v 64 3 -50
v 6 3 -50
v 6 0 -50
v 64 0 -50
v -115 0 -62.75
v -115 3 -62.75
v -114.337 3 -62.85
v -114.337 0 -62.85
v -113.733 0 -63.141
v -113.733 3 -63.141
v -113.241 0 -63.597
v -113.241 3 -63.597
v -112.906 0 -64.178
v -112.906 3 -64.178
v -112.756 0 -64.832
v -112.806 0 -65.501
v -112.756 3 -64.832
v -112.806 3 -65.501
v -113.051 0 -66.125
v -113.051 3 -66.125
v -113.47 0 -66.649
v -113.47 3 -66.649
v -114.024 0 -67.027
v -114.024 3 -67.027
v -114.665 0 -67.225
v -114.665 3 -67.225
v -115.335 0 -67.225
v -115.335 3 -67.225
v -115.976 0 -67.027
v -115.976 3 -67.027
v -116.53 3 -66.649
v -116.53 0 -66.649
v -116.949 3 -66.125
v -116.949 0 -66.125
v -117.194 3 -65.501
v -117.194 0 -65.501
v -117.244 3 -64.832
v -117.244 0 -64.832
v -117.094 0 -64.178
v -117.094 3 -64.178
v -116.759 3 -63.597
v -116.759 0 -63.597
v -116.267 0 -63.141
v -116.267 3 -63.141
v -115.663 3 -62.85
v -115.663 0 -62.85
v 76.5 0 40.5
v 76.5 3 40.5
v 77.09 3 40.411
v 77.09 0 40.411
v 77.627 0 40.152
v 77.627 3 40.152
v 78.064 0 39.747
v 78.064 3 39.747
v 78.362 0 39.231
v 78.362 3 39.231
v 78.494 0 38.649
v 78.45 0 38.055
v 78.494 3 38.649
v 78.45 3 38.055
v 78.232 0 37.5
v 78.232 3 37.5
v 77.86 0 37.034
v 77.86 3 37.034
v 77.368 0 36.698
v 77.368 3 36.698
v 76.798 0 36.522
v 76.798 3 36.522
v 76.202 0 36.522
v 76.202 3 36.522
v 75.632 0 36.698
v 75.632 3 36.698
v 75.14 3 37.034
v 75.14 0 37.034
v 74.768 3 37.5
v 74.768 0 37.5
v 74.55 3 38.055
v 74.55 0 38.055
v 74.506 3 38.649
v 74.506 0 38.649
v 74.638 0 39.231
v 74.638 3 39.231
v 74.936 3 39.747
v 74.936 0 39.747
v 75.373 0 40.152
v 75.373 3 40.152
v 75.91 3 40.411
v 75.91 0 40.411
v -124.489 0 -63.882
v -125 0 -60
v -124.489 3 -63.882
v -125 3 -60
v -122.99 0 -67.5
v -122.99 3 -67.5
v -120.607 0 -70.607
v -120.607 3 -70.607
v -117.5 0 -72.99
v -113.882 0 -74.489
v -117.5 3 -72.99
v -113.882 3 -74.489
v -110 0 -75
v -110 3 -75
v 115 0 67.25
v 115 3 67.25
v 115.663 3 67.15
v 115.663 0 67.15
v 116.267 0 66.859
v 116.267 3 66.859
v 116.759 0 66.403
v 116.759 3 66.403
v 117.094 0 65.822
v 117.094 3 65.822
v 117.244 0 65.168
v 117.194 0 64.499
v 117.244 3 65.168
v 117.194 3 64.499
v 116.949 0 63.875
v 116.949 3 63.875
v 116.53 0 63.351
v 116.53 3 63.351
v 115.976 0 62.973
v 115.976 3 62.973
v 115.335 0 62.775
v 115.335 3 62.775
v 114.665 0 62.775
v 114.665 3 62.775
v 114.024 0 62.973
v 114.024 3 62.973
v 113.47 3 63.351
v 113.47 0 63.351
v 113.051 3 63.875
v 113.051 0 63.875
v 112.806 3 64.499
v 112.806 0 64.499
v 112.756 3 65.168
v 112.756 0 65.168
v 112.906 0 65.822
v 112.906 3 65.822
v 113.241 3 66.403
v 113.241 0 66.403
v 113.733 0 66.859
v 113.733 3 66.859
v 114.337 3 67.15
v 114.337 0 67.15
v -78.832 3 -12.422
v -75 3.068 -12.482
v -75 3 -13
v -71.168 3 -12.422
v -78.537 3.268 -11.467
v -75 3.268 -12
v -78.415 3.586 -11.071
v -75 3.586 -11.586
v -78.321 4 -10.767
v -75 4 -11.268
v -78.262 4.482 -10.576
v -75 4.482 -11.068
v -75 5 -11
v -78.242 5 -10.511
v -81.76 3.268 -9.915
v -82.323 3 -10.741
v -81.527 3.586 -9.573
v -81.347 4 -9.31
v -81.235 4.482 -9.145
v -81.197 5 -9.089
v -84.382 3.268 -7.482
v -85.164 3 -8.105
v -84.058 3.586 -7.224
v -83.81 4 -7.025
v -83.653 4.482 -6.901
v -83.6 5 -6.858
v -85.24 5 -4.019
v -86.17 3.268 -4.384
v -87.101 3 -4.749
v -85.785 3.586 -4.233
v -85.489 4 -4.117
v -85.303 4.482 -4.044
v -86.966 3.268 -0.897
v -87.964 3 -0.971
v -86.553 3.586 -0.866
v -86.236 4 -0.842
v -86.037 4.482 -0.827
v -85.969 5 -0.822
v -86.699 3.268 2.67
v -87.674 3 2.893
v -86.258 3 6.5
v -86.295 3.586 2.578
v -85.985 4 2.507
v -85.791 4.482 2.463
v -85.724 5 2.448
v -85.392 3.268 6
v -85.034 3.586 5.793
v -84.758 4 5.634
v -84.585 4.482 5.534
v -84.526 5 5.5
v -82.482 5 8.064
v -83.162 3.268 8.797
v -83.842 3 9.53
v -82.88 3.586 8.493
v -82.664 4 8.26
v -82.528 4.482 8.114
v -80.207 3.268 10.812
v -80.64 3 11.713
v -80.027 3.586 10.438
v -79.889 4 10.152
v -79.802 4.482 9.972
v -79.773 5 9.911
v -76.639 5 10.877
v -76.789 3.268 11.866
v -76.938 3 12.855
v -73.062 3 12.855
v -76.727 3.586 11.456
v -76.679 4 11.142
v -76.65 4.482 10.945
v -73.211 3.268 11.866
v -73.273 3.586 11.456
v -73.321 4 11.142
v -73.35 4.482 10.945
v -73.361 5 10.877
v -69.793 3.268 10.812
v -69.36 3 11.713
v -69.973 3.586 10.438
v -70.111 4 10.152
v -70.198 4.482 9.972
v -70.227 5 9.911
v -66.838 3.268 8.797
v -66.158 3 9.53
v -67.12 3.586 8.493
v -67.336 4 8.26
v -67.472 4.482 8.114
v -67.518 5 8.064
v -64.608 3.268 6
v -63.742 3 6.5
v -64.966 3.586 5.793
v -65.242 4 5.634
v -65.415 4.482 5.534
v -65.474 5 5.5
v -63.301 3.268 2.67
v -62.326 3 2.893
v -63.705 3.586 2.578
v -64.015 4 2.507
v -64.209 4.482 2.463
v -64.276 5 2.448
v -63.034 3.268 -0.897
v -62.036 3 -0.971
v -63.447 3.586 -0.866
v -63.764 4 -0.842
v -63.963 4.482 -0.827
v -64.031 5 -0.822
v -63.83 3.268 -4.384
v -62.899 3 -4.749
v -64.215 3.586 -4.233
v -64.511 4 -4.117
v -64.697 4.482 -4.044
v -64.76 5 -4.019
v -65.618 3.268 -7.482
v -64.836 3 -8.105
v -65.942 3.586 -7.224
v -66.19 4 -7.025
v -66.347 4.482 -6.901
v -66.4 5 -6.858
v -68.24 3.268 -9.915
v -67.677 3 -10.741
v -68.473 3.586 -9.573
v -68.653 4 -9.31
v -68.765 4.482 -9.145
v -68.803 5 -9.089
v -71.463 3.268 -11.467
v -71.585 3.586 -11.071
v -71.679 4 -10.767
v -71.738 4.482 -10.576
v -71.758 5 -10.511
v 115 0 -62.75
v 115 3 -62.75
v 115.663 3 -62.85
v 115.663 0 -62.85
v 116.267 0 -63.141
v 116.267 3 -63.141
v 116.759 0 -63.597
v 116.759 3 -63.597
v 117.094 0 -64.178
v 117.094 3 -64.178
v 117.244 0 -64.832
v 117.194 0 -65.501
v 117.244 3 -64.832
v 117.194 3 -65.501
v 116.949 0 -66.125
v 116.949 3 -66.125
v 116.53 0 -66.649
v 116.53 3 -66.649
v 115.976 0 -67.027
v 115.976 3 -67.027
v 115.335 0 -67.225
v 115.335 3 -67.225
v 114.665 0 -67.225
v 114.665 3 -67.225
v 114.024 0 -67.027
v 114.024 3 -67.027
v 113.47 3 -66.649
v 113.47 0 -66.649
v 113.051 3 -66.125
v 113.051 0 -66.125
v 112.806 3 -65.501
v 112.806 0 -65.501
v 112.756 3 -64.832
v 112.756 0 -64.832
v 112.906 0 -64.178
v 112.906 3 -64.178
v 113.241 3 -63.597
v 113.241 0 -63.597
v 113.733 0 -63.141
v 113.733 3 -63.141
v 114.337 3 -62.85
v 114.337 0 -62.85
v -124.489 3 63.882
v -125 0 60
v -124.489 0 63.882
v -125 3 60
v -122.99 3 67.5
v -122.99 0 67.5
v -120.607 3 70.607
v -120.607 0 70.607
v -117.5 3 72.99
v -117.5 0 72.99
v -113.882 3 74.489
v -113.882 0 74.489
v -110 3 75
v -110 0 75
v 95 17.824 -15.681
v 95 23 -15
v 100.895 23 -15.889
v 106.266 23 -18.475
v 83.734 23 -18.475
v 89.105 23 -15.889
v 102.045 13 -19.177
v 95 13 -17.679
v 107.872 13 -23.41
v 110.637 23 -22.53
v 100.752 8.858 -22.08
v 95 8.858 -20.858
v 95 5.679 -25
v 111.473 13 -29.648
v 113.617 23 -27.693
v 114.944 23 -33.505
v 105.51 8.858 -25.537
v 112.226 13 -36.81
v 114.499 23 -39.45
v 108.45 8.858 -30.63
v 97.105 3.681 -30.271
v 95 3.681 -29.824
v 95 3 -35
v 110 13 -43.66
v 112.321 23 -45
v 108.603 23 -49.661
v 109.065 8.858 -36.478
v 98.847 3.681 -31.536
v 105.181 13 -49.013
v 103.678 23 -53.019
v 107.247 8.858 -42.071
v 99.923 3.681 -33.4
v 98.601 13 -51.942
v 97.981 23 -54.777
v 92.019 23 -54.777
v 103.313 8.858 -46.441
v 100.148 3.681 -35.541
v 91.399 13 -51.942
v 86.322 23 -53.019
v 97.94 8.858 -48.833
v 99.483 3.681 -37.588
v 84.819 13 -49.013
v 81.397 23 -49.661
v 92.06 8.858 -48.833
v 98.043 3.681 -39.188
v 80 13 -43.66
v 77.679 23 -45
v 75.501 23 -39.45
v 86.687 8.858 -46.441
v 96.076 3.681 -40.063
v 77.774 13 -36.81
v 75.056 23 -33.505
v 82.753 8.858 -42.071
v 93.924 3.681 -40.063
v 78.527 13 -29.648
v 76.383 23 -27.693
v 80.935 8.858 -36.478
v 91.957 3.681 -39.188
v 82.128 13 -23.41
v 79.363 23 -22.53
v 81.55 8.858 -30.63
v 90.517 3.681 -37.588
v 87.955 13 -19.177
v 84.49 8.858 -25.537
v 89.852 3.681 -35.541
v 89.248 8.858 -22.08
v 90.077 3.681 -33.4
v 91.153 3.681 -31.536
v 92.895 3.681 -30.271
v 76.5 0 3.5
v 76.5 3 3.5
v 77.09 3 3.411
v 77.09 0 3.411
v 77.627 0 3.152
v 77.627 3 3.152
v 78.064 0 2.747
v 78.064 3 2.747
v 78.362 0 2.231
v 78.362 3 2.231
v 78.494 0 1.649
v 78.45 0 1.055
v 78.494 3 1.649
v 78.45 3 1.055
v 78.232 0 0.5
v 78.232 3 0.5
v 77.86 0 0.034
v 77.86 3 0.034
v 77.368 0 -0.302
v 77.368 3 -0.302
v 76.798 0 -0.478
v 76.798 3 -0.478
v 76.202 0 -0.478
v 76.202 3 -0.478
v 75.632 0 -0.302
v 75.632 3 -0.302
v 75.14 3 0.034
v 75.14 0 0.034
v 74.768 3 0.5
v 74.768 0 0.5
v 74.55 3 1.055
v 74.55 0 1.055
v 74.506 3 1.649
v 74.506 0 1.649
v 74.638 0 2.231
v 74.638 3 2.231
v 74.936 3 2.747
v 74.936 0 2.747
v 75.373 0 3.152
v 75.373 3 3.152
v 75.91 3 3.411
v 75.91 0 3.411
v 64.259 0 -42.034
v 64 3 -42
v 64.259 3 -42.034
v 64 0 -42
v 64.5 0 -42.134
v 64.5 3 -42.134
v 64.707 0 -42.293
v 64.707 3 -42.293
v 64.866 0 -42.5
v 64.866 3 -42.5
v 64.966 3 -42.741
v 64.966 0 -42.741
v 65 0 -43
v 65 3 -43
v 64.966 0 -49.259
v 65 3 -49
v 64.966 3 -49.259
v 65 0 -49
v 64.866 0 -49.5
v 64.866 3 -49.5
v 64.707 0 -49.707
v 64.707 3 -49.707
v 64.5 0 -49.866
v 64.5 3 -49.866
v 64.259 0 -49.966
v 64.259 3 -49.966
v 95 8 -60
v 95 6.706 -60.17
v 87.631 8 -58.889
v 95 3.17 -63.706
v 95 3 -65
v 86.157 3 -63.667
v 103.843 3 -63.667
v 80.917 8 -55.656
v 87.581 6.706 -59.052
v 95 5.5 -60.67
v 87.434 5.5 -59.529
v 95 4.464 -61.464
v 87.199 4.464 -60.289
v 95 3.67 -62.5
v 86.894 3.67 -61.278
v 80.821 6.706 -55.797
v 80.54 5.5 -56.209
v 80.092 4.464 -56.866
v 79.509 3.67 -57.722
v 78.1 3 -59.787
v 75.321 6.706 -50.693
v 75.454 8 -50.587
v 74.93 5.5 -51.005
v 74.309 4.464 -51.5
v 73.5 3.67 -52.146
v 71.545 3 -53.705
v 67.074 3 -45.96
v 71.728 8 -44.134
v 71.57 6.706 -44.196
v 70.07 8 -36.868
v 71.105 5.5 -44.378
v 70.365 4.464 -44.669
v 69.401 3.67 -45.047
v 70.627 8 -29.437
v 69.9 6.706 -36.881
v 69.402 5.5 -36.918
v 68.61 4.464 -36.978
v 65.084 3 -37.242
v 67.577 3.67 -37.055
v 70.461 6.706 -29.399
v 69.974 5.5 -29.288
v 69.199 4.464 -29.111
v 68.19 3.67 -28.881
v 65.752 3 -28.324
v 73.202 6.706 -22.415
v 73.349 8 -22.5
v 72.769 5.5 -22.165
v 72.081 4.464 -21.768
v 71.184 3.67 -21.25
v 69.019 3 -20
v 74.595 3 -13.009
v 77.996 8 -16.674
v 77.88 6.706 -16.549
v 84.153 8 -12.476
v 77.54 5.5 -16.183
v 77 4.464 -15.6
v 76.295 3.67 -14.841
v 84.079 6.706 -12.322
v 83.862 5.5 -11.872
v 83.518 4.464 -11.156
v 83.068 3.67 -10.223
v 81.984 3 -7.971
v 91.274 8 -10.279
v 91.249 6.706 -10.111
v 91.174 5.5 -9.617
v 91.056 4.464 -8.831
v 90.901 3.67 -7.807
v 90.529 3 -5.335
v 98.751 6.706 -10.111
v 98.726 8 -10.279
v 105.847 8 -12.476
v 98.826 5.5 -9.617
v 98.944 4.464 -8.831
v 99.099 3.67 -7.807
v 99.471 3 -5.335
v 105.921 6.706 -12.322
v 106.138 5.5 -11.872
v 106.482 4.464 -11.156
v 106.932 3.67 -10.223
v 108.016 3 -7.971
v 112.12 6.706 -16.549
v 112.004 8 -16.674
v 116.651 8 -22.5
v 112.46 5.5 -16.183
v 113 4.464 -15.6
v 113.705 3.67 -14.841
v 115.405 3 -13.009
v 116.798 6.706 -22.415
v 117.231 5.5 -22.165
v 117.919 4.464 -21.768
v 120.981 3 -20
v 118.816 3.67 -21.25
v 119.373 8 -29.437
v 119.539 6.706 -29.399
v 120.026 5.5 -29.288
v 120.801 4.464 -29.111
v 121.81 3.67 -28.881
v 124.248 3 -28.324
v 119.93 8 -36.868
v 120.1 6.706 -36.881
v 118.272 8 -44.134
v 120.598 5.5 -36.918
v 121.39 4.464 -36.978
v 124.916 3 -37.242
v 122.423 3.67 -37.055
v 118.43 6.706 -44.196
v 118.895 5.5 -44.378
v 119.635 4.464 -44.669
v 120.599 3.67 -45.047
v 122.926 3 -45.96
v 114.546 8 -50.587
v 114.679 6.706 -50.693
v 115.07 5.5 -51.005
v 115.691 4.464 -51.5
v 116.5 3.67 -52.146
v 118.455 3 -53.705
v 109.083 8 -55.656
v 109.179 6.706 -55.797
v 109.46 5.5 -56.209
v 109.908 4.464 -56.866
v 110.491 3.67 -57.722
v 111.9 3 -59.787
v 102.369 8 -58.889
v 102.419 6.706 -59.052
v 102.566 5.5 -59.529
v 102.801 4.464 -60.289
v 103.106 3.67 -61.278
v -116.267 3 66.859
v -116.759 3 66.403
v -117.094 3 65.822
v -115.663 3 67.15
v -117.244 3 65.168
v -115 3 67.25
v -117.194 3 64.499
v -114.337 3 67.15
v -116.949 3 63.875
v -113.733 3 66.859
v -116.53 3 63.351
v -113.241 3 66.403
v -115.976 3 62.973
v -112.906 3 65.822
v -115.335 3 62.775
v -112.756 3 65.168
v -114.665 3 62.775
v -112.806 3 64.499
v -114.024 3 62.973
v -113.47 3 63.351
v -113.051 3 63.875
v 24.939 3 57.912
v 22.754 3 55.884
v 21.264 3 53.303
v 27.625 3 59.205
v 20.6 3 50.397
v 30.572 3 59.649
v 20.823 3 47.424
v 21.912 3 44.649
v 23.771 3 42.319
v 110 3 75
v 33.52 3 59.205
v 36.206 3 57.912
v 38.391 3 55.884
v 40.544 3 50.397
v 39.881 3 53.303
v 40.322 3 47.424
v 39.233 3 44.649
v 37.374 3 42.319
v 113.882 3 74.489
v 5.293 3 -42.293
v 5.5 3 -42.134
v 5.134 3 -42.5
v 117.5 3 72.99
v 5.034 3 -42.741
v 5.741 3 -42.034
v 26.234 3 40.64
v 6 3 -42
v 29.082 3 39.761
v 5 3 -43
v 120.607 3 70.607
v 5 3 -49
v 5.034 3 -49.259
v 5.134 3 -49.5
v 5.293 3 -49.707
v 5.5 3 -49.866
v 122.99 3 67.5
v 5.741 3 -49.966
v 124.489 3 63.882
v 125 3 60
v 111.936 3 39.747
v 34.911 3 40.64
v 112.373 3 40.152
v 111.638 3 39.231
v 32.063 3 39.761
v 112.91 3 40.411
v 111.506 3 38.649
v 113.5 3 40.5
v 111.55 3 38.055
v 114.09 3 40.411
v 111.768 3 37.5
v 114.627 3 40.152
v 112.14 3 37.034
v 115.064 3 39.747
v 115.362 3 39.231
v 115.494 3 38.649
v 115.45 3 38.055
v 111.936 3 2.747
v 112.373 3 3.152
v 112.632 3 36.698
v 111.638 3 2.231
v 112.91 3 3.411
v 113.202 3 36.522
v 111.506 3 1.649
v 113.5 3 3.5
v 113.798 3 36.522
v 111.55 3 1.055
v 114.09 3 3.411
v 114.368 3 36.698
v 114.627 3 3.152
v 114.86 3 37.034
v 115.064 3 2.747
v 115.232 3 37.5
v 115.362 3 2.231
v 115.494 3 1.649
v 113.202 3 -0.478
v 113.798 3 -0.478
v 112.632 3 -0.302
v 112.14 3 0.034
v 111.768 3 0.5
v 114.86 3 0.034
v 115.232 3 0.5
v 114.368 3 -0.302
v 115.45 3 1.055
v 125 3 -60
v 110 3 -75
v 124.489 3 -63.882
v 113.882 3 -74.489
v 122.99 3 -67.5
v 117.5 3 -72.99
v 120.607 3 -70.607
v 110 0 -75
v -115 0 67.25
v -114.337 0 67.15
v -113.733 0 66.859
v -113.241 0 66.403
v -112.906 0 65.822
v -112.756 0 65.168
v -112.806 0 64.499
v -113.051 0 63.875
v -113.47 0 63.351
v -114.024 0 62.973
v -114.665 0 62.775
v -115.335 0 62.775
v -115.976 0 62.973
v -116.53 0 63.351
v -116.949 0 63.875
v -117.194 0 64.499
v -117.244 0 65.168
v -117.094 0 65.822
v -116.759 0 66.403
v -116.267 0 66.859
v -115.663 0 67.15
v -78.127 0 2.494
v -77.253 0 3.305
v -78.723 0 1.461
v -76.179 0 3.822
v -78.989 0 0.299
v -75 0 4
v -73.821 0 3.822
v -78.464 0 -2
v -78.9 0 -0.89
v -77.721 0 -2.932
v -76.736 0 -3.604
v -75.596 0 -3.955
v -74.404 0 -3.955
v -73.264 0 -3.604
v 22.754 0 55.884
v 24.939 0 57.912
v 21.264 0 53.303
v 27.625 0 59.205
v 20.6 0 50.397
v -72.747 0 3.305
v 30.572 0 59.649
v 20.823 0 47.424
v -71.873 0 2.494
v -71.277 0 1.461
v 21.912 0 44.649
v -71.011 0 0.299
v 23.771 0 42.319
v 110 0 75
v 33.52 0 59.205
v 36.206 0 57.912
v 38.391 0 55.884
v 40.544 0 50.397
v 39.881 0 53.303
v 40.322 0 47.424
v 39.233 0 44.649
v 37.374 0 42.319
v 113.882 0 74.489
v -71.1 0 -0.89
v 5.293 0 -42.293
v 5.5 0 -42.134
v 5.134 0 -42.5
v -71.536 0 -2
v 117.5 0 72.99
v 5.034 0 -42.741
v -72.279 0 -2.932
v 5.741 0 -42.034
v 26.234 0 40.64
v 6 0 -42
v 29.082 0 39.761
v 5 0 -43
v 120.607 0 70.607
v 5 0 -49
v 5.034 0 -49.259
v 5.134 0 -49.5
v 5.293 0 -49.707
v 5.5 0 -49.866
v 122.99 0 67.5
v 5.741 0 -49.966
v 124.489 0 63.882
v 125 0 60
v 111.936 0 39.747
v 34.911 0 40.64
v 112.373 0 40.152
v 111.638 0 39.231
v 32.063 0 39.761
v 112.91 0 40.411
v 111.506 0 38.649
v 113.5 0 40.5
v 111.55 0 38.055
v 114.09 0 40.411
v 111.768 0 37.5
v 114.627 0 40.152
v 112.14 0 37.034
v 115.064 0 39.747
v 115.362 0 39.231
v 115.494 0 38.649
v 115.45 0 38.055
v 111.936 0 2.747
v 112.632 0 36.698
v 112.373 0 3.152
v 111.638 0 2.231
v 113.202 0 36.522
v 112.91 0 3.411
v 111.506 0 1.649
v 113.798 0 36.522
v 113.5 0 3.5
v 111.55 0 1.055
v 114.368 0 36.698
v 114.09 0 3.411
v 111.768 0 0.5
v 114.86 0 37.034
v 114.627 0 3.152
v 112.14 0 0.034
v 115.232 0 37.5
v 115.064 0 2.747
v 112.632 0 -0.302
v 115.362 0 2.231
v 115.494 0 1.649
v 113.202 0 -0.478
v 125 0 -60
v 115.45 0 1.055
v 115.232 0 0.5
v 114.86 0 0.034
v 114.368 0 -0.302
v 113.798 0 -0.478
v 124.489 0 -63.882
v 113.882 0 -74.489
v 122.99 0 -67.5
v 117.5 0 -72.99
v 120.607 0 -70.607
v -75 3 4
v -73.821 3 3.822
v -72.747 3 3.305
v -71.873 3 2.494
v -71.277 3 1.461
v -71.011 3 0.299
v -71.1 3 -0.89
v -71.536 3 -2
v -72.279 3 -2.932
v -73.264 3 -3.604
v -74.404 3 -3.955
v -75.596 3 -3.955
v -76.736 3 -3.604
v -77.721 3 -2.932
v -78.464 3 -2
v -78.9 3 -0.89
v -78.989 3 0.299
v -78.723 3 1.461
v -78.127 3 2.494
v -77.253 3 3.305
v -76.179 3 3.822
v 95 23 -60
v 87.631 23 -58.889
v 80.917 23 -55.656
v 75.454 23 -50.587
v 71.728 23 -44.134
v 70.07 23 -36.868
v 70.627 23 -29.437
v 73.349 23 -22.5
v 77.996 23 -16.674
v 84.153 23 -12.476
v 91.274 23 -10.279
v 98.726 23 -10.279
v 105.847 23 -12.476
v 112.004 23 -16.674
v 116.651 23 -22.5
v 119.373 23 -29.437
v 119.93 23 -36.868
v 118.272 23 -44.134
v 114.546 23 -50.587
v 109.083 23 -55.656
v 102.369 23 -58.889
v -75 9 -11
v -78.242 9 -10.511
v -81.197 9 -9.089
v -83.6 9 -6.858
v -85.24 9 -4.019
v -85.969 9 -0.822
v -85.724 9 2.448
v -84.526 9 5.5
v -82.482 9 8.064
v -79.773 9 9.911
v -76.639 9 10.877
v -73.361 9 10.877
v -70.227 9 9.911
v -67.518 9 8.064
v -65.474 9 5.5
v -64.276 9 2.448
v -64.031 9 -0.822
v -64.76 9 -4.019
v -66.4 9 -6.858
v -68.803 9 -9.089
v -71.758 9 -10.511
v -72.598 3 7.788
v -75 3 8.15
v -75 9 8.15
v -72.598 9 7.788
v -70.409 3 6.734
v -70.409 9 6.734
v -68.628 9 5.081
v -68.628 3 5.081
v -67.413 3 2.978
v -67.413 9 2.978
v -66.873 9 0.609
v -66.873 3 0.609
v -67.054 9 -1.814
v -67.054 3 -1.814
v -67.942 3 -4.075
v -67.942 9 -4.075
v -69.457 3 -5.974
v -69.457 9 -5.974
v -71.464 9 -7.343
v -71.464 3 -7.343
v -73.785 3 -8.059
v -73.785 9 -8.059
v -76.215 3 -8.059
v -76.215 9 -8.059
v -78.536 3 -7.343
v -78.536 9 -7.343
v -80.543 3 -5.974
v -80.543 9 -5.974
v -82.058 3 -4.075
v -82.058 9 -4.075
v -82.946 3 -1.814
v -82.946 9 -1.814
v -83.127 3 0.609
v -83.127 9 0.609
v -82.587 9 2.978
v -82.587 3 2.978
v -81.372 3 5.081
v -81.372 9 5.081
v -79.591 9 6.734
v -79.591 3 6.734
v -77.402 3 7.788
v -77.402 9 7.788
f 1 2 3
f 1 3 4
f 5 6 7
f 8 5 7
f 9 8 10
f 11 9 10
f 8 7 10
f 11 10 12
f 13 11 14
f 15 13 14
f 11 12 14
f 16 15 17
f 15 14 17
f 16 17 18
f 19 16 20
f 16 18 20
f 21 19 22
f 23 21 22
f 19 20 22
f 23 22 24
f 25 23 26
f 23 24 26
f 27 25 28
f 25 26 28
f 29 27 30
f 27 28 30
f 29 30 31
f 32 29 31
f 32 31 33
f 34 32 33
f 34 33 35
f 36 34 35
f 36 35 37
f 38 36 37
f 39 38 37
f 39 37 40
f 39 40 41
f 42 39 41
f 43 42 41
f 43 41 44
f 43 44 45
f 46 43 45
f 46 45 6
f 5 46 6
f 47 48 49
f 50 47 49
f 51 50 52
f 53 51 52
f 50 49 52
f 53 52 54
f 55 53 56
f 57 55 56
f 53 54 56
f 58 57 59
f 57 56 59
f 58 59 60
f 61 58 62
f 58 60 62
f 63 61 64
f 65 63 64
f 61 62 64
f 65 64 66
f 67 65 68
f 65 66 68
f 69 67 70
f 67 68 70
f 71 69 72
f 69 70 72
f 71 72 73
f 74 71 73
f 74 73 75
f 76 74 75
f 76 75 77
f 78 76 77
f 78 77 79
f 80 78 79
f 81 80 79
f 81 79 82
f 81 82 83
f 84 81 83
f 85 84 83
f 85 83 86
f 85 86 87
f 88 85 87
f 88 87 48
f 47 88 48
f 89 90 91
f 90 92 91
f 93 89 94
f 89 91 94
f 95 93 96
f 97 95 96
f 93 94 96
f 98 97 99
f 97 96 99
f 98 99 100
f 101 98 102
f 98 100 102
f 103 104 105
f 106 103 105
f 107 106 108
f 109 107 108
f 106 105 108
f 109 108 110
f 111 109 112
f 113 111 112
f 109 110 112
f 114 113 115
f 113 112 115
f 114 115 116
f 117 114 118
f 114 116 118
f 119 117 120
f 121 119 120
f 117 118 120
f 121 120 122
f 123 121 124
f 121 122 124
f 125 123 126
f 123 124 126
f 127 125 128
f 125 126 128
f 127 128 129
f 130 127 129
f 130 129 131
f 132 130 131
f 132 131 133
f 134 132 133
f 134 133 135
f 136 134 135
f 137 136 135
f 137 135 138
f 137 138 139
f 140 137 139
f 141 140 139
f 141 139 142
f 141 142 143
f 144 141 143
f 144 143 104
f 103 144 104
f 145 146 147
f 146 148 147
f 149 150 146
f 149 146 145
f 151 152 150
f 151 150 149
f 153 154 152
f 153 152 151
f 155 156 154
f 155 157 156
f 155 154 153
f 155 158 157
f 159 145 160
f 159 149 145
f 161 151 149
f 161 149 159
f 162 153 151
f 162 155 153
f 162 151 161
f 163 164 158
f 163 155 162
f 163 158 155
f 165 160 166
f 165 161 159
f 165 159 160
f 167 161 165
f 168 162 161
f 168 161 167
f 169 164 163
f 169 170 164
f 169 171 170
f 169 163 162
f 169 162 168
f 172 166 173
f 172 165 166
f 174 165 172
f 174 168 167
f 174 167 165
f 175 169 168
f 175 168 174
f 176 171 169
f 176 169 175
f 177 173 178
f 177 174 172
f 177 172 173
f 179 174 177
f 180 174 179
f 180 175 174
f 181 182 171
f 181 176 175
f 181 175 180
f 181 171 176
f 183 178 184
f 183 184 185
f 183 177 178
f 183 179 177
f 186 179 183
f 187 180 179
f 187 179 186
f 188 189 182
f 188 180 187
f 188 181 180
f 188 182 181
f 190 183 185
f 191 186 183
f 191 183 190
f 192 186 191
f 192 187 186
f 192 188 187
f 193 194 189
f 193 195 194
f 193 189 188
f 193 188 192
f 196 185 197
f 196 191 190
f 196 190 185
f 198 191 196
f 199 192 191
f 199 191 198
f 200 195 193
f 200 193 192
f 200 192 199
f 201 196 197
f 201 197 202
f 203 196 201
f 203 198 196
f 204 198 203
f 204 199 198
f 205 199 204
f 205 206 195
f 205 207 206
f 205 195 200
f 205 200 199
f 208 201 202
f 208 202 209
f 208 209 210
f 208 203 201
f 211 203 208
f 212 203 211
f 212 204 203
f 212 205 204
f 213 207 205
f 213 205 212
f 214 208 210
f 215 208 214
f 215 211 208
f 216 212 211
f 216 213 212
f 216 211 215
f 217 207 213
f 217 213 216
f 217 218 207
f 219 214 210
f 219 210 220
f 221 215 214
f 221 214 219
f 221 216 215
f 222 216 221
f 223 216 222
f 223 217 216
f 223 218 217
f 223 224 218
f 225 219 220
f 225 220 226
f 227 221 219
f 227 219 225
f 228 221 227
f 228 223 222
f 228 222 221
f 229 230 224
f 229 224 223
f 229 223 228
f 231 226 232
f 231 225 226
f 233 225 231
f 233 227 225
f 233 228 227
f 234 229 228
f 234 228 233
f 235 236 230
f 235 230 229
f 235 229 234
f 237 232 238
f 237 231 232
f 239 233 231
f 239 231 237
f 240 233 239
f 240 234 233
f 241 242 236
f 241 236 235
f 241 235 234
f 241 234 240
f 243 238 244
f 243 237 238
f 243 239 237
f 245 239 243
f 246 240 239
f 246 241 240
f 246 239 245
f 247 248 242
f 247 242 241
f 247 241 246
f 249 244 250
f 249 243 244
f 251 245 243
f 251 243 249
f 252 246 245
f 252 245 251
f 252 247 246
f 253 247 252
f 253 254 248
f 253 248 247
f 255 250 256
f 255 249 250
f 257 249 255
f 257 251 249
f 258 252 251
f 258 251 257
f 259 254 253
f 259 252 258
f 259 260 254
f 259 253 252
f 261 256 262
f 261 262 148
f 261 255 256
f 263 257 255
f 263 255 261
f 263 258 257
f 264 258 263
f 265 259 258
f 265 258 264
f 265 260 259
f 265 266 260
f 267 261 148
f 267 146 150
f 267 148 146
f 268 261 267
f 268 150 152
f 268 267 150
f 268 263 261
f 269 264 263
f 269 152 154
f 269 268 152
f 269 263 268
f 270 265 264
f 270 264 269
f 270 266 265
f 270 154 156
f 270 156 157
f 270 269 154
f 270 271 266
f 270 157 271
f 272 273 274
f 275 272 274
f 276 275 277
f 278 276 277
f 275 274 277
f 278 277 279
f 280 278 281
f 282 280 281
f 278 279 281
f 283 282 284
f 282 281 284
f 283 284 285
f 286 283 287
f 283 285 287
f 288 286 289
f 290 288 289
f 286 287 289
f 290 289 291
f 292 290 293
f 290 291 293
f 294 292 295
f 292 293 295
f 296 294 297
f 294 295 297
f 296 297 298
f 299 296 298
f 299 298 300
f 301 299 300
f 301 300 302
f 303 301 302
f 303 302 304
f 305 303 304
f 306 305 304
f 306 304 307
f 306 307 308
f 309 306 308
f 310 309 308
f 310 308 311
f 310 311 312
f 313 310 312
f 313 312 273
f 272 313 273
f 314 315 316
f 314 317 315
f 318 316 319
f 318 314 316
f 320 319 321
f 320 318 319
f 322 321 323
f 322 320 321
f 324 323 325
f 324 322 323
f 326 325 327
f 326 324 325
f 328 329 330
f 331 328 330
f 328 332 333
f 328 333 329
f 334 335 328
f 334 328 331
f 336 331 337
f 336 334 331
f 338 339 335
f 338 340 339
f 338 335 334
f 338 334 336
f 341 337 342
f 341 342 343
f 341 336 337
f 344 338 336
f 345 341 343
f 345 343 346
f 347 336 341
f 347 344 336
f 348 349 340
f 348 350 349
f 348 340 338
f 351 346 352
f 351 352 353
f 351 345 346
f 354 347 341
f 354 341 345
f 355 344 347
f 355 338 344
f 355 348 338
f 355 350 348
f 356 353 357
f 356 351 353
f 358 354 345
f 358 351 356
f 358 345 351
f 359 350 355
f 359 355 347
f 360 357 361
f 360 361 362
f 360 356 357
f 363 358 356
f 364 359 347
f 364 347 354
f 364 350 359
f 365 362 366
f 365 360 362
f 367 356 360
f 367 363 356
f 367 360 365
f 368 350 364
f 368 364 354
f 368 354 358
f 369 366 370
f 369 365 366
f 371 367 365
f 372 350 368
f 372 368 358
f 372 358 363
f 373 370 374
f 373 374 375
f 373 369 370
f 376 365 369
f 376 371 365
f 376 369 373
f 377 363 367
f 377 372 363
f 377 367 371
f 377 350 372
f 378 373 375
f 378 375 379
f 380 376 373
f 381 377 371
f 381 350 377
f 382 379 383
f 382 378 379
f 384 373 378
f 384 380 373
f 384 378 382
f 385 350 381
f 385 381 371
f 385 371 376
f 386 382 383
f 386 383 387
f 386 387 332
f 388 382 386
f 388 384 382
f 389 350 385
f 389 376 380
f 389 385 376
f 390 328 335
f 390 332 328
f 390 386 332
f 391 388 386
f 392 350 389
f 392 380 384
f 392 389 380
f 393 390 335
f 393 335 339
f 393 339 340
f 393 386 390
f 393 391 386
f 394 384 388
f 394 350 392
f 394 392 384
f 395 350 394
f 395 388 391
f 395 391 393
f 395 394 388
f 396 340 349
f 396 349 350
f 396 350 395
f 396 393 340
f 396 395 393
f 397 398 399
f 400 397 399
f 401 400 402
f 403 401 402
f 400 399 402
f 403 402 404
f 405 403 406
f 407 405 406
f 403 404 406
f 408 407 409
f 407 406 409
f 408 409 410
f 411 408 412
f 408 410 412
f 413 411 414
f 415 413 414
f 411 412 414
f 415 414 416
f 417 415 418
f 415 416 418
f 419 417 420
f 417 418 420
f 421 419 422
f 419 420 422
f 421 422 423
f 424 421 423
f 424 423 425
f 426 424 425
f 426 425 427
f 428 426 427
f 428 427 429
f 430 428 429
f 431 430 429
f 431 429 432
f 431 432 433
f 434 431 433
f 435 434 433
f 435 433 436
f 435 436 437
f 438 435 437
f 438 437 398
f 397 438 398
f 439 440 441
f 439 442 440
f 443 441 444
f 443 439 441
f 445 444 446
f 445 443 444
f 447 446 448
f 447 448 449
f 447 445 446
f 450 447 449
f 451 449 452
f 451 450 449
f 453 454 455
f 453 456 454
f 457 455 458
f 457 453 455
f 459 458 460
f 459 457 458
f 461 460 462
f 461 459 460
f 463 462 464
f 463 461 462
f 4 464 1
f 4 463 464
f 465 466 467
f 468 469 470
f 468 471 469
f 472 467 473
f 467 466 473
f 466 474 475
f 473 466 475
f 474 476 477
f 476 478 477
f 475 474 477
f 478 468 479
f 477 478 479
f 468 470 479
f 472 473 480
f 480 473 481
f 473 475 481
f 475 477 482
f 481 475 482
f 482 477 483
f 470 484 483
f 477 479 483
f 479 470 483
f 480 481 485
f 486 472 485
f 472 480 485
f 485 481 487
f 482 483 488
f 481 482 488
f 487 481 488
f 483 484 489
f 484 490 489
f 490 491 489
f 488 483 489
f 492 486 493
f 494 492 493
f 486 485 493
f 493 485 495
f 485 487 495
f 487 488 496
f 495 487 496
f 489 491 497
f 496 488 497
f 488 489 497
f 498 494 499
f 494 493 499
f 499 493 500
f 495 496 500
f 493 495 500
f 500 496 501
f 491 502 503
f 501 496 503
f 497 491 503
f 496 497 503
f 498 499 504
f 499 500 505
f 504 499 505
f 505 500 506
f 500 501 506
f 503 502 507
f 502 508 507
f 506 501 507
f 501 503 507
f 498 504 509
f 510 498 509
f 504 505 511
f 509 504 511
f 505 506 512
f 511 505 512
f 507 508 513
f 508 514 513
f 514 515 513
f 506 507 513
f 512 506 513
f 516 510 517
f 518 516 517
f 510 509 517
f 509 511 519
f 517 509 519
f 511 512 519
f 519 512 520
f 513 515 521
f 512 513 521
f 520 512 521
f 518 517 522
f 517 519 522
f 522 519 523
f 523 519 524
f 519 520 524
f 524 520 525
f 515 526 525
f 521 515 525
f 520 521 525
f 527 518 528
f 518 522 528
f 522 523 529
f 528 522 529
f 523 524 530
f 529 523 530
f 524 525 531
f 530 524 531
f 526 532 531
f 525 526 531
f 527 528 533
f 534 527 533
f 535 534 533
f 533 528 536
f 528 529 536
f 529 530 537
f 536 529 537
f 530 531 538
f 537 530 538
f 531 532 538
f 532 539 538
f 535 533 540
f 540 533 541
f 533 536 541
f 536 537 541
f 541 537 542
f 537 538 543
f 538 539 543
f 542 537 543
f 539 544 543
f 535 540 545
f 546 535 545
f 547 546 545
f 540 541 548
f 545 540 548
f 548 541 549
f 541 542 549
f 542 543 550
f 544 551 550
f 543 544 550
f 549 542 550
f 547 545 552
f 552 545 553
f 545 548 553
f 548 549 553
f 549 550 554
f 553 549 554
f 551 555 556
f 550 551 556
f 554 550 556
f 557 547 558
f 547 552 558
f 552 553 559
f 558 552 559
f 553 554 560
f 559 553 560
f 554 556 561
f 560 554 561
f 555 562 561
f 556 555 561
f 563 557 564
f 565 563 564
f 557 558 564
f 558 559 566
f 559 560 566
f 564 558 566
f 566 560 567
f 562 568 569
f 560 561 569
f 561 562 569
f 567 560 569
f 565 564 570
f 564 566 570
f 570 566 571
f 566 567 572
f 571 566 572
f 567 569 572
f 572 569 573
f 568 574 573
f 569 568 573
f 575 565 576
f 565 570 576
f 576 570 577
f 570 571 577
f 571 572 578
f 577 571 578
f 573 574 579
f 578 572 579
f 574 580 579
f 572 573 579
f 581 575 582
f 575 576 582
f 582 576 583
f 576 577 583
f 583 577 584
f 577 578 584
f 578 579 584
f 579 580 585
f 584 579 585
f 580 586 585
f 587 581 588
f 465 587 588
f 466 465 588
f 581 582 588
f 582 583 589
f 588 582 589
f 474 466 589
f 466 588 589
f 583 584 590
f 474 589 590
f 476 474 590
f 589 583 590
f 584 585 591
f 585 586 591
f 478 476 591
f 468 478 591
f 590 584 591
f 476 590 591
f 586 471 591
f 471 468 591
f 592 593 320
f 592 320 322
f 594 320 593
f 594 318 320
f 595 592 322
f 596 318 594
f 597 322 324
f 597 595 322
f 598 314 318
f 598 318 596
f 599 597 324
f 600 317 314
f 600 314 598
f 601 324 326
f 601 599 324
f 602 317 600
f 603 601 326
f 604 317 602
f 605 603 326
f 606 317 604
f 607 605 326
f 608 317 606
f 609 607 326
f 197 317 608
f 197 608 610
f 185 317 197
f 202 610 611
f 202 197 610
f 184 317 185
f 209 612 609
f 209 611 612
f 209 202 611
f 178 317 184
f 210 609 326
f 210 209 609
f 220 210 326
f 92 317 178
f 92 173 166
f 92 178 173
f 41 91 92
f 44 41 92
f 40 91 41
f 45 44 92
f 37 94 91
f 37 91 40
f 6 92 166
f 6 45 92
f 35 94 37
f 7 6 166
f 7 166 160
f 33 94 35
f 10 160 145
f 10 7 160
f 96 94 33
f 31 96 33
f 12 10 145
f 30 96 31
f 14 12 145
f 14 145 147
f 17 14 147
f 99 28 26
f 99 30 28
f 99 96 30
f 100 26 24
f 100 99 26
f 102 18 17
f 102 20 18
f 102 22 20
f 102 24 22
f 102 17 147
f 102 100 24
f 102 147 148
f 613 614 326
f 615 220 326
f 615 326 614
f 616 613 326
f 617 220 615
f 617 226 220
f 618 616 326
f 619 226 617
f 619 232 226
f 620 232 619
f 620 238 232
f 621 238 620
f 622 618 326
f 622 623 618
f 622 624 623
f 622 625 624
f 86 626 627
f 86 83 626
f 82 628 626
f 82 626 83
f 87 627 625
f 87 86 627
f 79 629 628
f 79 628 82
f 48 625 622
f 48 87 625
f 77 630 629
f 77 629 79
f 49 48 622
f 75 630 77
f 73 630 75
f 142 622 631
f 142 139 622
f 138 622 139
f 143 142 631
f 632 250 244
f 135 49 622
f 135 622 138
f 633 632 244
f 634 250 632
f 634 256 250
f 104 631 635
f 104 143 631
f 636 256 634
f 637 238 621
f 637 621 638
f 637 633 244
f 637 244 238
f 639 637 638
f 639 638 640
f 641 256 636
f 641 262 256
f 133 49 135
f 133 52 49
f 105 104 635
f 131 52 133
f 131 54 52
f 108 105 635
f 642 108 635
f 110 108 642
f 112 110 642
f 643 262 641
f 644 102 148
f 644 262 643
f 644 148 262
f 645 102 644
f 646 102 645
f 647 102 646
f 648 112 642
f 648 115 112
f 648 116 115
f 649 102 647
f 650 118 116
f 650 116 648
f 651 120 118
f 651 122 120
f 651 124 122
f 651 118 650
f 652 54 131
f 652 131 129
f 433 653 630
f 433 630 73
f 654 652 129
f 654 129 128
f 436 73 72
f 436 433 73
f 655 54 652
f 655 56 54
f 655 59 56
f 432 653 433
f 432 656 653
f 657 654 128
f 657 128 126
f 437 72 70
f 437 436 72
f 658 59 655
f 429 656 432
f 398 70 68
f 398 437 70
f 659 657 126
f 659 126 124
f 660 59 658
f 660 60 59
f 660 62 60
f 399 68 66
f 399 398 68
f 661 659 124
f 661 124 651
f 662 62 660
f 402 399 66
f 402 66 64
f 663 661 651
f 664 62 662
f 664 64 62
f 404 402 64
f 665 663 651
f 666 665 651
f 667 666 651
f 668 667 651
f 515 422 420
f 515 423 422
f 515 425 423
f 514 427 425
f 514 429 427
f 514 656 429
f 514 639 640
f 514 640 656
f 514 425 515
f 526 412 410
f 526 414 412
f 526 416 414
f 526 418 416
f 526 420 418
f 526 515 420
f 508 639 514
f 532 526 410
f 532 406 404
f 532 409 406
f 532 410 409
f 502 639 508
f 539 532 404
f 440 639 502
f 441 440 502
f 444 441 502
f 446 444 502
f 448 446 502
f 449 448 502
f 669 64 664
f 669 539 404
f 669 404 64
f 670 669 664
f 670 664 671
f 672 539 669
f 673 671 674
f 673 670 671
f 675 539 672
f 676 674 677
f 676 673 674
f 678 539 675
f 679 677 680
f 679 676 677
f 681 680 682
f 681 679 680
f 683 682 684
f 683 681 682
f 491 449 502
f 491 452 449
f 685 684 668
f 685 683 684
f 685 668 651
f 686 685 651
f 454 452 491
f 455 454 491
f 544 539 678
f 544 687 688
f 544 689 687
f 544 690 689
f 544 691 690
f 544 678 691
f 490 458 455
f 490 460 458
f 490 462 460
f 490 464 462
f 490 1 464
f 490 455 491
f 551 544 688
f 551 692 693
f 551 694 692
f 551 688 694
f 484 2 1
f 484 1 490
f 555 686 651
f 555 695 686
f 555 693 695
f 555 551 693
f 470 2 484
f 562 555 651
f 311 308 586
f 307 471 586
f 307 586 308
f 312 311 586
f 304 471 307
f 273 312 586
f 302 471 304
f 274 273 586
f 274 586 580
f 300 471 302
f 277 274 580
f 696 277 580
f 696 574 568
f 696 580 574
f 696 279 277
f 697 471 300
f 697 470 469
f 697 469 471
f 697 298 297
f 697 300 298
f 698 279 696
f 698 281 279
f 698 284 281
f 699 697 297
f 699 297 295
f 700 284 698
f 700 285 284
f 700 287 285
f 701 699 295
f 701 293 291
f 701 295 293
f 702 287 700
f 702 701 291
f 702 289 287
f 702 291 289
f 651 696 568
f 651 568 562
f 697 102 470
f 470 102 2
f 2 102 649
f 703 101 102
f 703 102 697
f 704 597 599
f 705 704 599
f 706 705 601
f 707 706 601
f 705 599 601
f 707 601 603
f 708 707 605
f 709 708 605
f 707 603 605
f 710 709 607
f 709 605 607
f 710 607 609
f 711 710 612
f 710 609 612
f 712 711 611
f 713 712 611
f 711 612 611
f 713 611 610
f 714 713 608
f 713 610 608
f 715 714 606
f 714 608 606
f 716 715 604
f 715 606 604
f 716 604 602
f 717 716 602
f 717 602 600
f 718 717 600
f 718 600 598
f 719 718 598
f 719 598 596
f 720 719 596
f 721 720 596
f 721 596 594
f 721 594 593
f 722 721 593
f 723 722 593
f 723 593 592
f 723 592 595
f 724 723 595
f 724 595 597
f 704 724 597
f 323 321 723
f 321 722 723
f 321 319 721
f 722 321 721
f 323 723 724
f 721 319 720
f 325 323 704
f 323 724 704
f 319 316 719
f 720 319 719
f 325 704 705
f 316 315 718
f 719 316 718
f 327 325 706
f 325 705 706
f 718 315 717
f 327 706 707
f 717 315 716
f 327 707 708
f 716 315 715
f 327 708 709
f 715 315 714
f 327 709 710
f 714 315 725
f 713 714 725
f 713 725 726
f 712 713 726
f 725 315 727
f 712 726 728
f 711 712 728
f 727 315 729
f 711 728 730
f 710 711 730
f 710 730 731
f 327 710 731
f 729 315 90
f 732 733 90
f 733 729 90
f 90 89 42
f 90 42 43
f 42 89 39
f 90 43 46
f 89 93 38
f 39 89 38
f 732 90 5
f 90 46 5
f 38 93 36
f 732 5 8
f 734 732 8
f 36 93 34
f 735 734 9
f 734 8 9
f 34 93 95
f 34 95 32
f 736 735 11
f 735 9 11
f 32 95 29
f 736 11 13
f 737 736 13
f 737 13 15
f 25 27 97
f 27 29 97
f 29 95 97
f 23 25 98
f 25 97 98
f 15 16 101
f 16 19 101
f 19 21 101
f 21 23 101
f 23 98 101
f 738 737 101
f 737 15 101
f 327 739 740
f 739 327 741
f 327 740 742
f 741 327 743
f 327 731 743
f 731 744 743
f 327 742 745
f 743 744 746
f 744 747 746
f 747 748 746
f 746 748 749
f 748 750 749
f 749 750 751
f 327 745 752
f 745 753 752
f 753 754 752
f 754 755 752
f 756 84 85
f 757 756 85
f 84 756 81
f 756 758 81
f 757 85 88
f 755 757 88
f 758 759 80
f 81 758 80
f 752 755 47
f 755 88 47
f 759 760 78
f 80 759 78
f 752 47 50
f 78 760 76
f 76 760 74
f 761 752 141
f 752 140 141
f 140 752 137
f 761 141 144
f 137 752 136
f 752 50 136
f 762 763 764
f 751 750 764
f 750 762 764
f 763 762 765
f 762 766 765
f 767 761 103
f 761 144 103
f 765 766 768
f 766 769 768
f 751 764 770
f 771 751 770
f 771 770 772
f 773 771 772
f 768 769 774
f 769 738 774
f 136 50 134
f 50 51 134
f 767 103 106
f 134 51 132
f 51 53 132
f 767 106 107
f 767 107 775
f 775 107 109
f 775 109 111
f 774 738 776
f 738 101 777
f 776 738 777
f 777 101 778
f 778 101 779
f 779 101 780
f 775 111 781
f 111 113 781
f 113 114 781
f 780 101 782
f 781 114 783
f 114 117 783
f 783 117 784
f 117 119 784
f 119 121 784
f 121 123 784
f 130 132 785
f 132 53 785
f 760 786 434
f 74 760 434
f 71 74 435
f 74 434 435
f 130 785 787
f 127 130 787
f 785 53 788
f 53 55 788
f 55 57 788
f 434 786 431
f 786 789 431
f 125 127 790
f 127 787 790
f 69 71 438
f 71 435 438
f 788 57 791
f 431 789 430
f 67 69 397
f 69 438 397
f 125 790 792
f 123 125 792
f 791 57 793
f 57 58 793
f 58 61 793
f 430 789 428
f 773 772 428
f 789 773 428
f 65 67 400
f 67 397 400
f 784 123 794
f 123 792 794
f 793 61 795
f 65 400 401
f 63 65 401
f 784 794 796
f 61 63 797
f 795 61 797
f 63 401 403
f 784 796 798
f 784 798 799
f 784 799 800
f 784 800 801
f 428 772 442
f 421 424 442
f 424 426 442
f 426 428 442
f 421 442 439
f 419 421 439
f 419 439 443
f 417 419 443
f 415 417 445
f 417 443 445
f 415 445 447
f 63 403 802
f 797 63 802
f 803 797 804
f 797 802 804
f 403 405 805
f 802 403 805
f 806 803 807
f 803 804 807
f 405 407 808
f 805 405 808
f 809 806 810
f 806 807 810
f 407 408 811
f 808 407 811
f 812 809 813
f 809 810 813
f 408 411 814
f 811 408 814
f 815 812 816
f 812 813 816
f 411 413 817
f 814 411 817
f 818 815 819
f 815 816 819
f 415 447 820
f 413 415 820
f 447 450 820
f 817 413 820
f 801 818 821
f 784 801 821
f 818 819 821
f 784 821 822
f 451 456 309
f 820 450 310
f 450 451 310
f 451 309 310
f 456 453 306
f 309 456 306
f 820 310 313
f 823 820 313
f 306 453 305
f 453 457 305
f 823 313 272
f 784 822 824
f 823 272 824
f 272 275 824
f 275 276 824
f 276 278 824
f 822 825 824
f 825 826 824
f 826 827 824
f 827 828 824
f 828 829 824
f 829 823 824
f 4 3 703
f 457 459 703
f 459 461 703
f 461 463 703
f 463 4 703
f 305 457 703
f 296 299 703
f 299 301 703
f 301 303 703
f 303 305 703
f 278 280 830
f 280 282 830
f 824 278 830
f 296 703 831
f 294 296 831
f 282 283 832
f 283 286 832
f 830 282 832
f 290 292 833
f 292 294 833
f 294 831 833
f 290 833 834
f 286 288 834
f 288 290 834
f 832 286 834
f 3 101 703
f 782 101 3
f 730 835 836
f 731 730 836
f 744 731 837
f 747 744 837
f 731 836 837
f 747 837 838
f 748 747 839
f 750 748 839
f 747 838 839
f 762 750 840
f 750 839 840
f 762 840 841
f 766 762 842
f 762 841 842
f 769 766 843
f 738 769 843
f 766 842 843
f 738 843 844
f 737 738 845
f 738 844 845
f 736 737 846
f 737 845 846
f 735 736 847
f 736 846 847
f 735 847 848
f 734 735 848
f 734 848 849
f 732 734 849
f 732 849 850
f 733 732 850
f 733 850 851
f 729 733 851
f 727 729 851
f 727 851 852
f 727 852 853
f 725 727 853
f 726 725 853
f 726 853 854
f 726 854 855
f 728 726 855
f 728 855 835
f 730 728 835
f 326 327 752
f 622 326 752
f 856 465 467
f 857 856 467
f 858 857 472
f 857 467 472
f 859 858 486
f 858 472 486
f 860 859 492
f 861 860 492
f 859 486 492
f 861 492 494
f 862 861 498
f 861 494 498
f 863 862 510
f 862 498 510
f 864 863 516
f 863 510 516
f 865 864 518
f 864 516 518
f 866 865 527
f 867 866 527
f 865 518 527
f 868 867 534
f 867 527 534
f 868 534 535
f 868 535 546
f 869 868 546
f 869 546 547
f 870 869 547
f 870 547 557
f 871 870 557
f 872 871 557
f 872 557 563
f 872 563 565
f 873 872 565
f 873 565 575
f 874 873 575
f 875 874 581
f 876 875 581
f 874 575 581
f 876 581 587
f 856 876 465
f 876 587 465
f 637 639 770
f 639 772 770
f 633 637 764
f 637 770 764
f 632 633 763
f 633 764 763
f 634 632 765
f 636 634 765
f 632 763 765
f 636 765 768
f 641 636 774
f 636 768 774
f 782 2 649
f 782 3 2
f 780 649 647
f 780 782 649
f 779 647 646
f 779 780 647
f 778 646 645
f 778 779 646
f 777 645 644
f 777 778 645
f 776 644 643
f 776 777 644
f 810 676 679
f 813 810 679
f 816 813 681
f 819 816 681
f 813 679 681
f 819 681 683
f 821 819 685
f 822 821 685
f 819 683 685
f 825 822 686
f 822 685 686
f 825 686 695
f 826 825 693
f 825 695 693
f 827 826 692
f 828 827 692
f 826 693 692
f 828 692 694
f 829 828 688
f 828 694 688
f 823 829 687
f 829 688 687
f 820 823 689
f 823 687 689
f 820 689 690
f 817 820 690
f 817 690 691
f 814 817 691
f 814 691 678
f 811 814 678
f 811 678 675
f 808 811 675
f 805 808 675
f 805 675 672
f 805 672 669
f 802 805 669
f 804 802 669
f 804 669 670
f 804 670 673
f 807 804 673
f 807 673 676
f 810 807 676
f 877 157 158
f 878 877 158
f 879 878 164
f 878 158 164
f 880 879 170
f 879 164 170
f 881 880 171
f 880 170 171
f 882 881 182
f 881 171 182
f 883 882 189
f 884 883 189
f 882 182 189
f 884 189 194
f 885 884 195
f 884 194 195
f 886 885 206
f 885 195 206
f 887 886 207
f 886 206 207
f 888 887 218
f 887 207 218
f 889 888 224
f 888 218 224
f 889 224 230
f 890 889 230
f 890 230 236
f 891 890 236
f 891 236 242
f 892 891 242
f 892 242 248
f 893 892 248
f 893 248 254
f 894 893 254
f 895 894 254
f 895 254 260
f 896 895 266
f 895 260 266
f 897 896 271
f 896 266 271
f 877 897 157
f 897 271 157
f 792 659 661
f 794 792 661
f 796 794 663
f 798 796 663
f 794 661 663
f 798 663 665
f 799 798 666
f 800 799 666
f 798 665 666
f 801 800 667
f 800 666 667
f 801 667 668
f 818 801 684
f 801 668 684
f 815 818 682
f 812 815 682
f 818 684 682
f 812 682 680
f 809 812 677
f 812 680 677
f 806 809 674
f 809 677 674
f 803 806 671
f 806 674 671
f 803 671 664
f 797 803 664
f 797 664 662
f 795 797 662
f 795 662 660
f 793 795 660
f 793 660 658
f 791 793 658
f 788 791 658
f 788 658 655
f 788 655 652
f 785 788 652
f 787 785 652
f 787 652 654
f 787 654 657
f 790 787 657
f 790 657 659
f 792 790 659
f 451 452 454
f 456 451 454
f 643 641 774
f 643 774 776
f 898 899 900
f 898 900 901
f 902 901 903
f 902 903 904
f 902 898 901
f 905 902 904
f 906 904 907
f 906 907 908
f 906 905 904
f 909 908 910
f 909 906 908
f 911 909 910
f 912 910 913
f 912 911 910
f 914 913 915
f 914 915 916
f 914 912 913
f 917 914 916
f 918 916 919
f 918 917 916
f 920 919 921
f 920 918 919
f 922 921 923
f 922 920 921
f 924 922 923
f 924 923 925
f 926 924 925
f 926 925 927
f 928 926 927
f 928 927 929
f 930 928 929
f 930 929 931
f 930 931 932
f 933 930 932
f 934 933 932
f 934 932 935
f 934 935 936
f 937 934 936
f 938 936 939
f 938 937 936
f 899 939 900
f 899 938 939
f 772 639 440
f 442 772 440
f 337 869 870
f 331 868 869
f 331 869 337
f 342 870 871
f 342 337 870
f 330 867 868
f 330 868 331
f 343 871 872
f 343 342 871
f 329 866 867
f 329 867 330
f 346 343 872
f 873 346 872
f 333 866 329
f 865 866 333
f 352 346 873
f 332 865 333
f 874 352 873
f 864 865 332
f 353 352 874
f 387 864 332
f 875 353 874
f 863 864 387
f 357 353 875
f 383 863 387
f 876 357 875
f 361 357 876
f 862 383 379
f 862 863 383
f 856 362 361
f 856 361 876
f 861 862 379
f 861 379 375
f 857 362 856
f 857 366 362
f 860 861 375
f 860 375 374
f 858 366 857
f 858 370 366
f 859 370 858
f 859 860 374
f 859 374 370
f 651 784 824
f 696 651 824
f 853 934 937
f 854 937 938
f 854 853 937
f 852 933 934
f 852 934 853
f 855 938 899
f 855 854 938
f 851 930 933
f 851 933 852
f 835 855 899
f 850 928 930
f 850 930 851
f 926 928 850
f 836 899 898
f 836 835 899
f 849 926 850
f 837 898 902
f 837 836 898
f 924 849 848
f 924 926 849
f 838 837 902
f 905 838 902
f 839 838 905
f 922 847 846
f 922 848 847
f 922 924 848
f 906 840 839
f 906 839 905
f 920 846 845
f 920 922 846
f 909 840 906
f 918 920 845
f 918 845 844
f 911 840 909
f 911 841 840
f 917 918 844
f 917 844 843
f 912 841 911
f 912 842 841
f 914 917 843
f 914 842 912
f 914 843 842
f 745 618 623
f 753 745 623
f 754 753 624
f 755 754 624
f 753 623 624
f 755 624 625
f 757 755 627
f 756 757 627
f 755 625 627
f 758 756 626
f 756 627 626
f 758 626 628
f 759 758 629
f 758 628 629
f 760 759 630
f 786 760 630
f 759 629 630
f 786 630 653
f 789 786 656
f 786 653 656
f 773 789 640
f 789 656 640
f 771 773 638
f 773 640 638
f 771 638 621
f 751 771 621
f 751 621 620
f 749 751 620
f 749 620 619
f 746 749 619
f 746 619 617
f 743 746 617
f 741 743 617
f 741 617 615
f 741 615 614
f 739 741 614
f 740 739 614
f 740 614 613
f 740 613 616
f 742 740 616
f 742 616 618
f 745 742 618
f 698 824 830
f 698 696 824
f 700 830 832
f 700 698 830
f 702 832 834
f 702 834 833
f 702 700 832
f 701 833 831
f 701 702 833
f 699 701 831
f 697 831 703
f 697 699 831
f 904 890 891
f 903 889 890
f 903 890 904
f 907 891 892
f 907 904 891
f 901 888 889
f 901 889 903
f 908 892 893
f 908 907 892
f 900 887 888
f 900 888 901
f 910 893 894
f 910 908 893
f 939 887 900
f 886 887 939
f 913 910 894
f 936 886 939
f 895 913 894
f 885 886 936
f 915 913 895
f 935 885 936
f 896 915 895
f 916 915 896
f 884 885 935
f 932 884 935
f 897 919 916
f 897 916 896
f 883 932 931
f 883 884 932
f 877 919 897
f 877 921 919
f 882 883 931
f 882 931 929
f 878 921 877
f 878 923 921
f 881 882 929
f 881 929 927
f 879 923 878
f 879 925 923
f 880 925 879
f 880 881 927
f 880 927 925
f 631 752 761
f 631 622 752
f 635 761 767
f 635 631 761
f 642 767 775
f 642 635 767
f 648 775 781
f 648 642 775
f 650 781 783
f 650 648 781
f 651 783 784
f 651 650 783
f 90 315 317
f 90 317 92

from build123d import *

# Parameters (mm, degrees)
CROQUIS1_W              = 250
CROQUIS1_H              = 150
SALIENTE_EXTRUIR1_DEPTH = 3
REDONDEO1_R             = 15
CORTAR_EXTRUIR1_REACH   = 147.805
CROQUIS2_R              = 2.25
CROQUIS3_R              = 4
CORTAR_EXTRUIR2_DEPTH   = 5
CROQUIS4_R              = 11
CROQUIS4_R_2            = 8.15
SALIENTE_EXTRUIR2_DEPTH = 6
REDONDEO2_R             = 2
CROQUIS5_R              = 25
CROQUIS5_R_2            = 20
SALIENTE_EXTRUIR3_DEPTH = 20
REDONDEO3_R             = 20
REDONDEO4_R             = 5
CROQUIS11_W             = 60
CROQUIS11_H             = 8
CORTAR_EXTRUIR6_DEPTH   = 20
REDONDEO7_R             = 1
CROQUIS12_R             = 10
CORTAR_EXTRUIR7_DEPTH   = 200
CROQUIS6_R              = 2
CORTAR_EXTRUIR8_DEPTH   = 10


with BuildPart() as part:
    # Croquis1 → Saliente-Extruir1 (new body)
    with BuildSketch(Plane(origin=(0, 0, 0), x_dir=(1, 0, 0), z_dir=(0, 1, 0))):
        Rectangle(CROQUIS1_W, CROQUIS1_H)
    extrude(amount=SALIENTE_EXTRUIR1_DEPTH)

    # Redondeo1
    redondeo1_edges = [part.edges().sort_by_distance(p)[0] for p in [
        (125, 1.5, 75),
        (-125, 1.5, 75),
        (-125, 1.5, -75),
        (125, 1.5, -75),
    ]]
    fillet(redondeo1_edges, radius=REDONDEO1_R)

    # Croquis2 → Cortar-Extruir1 (cut, up to next)
    with BuildSketch(Plane(origin=(0, 3, 0), x_dir=(1, 0, 0), z_dir=(0, 1, 0)), mode=Mode.PRIVATE) as cortar_extruir1_sk1:
        with Locations(Location((-115, 65, 0), (0, 0, 270))):
            Circle(CROQUIS2_R)
    cortar_extruir1_tool1 = extrude(cortar_extruir1_sk1.sketch, amount=-CORTAR_EXTRUIR1_REACH, mode=Mode.PRIVATE) & part.part
    # Croquis2 → Cortar-Extruir1 (cut, up to next)
    with BuildSketch(Plane(origin=(0, 3, 0), x_dir=(1, 0, 0), z_dir=(0, 1, 0)), mode=Mode.PRIVATE) as cortar_extruir1_sk2:
        with Locations(Location((115, 65, 0), (0, 0, 270))):
            Circle(CROQUIS2_R)
    cortar_extruir1_tool2 = extrude(cortar_extruir1_sk2.sketch, amount=-CORTAR_EXTRUIR1_REACH, mode=Mode.PRIVATE) & part.part
    # Croquis2 → Cortar-Extruir1 (cut, up to next)
    with BuildSketch(Plane(origin=(0, 3, 0), x_dir=(1, 0, 0), z_dir=(0, 1, 0)), mode=Mode.PRIVATE) as cortar_extruir1_sk3:
        with Locations(Location((115, -65, 0), (0, 0, 270))):
            Circle(CROQUIS2_R)
    cortar_extruir1_tool3 = extrude(cortar_extruir1_sk3.sketch, amount=-CORTAR_EXTRUIR1_REACH, mode=Mode.PRIVATE) & part.part
    # Croquis2 → Cortar-Extruir1 (cut, up to next)
    with BuildSketch(Plane(origin=(0, 3, 0), x_dir=(1, 0, 0), z_dir=(0, 1, 0)), mode=Mode.PRIVATE) as cortar_extruir1_sk4:
        with Locations(Location((-115, -65, 0), (0, 0, 270))):
            Circle(CROQUIS2_R)
    cortar_extruir1_tool4 = extrude(cortar_extruir1_sk4.sketch, amount=-CORTAR_EXTRUIR1_REACH, mode=Mode.PRIVATE) & part.part
    add(cortar_extruir1_tool1.solids().sort_by_distance((-115, 3, -65))[0], mode=Mode.SUBTRACT)
    add(cortar_extruir1_tool2.solids().sort_by_distance((115, 3, -65))[0], mode=Mode.SUBTRACT)
    add(cortar_extruir1_tool3.solids().sort_by_distance((115, 3, 65))[0], mode=Mode.SUBTRACT)
    add(cortar_extruir1_tool4.solids().sort_by_distance((-115, 3, 65))[0], mode=Mode.SUBTRACT)

    # Croquis3 → Cortar-Extruir2 (cut)
    with BuildSketch(Plane(origin=(0, 3, 0), x_dir=(1, 0, 0), z_dir=(0, 1, 0))):
        with Locations(Location((-75, 0, 0), (0, 0, 270))):
            Circle(CROQUIS3_R)
    extrude(amount=-CORTAR_EXTRUIR2_DEPTH, mode=Mode.SUBTRACT)

    # Croquis4 → Saliente-Extruir2 (add)
    with BuildSketch(Plane(origin=(0, 3, 0), x_dir=(1, 0, 0), z_dir=(0, 1, 0))):
        with Locations(Location((-75, 0, 0), (0, 0, 90))):
            Circle(CROQUIS4_R)
        with Locations(Location((-75, 0, 0), (0, 0, 270))):
            Circle(CROQUIS4_R_2, mode=Mode.SUBTRACT)
    extrude(amount=SALIENTE_EXTRUIR2_DEPTH)

    # Redondeo2
    redondeo2_edges = [part.edges().sort_by_distance(p)[0] for p in [
        (-75, 3, 11),
    ]]
    fillet(redondeo2_edges, radius=REDONDEO2_R)

    # Croquis5 → Saliente-Extruir3 (add)
    with BuildSketch(Plane(origin=(0, 3, 0), x_dir=(1, 0, 0), z_dir=(0, 1, 0))):
        with Locations(Location((95, 35, 0), (0, 0, 90))):
            Circle(CROQUIS5_R)
        with Locations(Location((95, 35, 0), (0, 0, 270))):
            Circle(CROQUIS5_R_2, mode=Mode.SUBTRACT)
    extrude(amount=SALIENTE_EXTRUIR3_DEPTH)

    # Redondeo3
    redondeo3_edges = [part.edges().sort_by_distance(p)[0] for p in [
        (95, 3, -55),
    ]]
    fillet(redondeo3_edges, radius=REDONDEO3_R - 0.0001)  # a hair under: the kernel refuses the full size

    # Redondeo4
    redondeo4_edges = [part.edges().sort_by_distance(p)[0] for p in [
        (95, 3, -10),
    ]]
    fillet(redondeo4_edges, radius=REDONDEO4_R - 0.0001)  # a hair under: the kernel refuses the full size

    # Croquis11 → Cortar-Extruir6 (cut)
    with BuildSketch(Plane(origin=(0, 3, 0), x_dir=(1, 0, 0), z_dir=(0, 1, 0))):
        with Locations((35, 46)):
            Rectangle(CROQUIS11_W, CROQUIS11_H)
    extrude(amount=-CORTAR_EXTRUIR6_DEPTH, mode=Mode.SUBTRACT)

    # Redondeo7
    redondeo7_edges = [part.edges().sort_by_distance(p)[0] for p in [
        (5, 1.5, -42),
        (5, 1.5, -50),
        (65, 1.5, -50),
        (65, 1.5, -42),
    ]]
    fillet(redondeo7_edges, radius=REDONDEO7_R)

    # Croquis12 → Cortar-Extruir7 (cut)
    with BuildSketch(Plane(origin=(0, 3, 0), x_dir=(1, 0, 0), z_dir=(0, 1, 0))):
        with Locations(Location((30.572379794, -49.649260846, 0), (0, 0, 270))):
            Circle(CROQUIS12_R)
    extrude(amount=-CORTAR_EXTRUIR7_DEPTH, mode=Mode.SUBTRACT)

    # Croquis6 → Cortar-Extruir8 (cut)
    with BuildSketch(Plane(origin=(0, 3, 0), x_dir=(1, 0, 0), z_dir=(0, 1, 0))):
        with Locations(Location((113.5, -1.5, 0), (0, 0, 270))):
            Circle(CROQUIS6_R)
        with Locations(Location((113.5, -38.5, 0), (0, 0, 270))):
            Circle(CROQUIS6_R)
        with Locations(Location((76.5, -38.5, 0), (0, 0, 270))):
            Circle(CROQUIS6_R)
        with Locations(Location((76.5, -1.5, 0), (0, 0, 270))):
            Circle(CROQUIS6_R)
    extrude(amount=-CORTAR_EXTRUIR8_DEPTH, mode=Mode.SUBTRACT)


solid = part.part
